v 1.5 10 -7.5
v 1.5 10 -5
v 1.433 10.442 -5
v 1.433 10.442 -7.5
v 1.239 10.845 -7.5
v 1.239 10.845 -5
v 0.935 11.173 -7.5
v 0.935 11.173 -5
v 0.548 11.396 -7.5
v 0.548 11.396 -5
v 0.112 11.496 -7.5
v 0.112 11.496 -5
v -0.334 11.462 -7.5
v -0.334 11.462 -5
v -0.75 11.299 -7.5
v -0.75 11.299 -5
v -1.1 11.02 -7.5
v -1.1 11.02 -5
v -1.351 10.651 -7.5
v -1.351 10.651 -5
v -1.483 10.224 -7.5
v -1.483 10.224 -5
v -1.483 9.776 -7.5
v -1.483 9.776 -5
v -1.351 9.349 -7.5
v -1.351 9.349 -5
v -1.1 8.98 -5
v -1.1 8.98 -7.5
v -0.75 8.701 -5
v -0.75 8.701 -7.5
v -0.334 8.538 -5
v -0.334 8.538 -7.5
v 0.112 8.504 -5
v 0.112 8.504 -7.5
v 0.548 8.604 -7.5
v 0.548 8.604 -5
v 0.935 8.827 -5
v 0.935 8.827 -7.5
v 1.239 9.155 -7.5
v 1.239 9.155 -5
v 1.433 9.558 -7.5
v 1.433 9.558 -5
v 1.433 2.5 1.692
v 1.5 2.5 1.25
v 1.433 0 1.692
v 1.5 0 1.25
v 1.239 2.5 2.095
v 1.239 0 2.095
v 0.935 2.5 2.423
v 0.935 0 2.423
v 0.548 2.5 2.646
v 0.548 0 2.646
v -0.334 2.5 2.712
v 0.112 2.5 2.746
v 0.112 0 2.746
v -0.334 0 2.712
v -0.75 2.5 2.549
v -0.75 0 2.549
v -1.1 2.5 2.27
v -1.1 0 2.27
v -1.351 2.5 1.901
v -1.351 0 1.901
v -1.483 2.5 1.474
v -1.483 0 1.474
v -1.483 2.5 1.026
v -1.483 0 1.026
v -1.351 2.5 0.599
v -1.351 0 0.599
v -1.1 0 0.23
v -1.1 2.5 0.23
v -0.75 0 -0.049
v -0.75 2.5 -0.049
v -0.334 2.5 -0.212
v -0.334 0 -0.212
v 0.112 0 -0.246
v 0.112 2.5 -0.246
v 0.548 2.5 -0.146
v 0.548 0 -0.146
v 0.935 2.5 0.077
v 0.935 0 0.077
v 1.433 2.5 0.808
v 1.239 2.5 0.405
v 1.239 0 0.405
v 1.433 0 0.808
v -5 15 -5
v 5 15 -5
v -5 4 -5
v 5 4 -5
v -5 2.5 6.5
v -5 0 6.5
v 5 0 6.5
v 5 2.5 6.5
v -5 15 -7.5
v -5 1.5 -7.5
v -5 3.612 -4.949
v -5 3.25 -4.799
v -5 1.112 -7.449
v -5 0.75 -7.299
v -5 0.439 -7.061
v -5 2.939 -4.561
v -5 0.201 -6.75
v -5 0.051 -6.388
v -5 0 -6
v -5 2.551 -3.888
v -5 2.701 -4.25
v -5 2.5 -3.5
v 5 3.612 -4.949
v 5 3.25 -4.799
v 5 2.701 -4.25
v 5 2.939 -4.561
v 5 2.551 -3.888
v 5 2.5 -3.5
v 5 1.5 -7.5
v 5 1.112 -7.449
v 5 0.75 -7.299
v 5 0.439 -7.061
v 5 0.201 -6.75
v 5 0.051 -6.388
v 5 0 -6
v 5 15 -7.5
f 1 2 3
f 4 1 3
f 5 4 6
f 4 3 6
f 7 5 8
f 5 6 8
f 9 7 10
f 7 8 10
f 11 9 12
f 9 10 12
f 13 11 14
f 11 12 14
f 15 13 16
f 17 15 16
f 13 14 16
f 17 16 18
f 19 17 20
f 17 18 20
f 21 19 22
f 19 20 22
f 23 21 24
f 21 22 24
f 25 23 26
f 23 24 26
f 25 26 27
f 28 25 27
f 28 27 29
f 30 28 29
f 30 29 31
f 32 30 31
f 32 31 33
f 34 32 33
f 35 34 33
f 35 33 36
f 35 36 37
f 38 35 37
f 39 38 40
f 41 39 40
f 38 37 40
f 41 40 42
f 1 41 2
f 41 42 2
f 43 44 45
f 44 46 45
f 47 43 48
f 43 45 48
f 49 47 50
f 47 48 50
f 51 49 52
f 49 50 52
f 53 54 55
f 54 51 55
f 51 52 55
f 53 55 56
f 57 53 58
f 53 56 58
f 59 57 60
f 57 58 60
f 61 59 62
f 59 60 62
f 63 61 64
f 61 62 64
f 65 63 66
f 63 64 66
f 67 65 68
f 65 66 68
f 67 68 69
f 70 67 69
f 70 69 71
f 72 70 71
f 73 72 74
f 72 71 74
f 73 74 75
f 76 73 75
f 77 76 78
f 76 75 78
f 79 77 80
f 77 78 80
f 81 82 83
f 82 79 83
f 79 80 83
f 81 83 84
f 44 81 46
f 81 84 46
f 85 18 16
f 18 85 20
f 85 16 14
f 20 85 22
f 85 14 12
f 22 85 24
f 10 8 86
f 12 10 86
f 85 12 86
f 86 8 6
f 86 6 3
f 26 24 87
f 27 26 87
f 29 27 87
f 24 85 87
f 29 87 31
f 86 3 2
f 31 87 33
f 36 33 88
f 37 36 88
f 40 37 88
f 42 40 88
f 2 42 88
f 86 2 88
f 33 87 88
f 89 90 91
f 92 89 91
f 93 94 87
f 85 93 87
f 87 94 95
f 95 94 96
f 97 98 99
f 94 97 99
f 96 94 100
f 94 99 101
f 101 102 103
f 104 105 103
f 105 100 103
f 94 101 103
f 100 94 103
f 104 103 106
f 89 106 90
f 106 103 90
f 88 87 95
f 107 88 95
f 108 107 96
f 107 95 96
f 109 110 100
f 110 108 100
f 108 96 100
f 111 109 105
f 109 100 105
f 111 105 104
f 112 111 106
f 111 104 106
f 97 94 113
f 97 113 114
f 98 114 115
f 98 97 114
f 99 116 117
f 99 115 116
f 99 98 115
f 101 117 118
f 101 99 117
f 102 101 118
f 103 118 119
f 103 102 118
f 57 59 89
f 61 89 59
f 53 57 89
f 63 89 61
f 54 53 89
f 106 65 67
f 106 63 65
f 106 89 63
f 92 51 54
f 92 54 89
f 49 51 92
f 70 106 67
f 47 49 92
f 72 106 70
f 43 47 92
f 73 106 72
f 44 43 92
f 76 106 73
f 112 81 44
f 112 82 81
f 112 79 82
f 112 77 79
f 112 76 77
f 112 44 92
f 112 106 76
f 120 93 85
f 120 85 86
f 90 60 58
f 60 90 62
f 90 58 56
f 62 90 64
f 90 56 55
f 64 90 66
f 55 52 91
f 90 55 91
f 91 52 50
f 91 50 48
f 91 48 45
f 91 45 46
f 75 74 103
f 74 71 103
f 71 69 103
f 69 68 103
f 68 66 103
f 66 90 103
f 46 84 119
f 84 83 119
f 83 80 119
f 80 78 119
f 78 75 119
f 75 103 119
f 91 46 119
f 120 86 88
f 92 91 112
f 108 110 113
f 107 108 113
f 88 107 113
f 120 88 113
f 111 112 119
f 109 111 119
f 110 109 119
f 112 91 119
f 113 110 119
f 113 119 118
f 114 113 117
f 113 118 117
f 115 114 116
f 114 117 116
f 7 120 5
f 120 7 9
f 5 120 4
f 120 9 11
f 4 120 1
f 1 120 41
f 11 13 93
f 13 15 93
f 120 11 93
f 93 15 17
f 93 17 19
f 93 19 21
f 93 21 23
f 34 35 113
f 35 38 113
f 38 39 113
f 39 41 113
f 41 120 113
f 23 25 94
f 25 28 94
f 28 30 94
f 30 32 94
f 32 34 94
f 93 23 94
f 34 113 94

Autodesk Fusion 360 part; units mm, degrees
sketch "Sketch1" plane through (0, 0, 0) normal (0, 1, 0) x (1, 0, 0)
  line L0 (5, 6.5) -> (-5, 6.5)
  line L1 (-5, 6.5) -> (-5, -6.5)
  line L2 (-5, -6.5) -> (5, -6.5)
  line L3 (5, -6.5) -> (5, 6.5)
  line L4 (5, 6.5) -> (-5, -6.5) construction
  line L5 (-5, 6.5) -> (5, -6.5) construction
  circle A0 centre (0, -1.25) radius 1.5
  dimension "d1" = 13
  dimension "d2" = 10
  dimension "d21" = 3
  dimension "d22" = 1.25
extrude "Extrude1" add sketch "Sketch1" along normal blind 2.5
sketch "Sketch3" plane through (0, 0, 0) normal (0, 1, 0) x (1, 0, 0)
  line L0 (-5, 5) -> (5, 5)
  line L1 (5, 5) -> (5, 7.5)
  line L2 (5, 7.5) -> (-5, 7.5)
  line L3 (-5, 7.5) -> (-5, 5)
  dimension "d10" = 2.5
  dimension "d11" = 10
  dimension "d12" = 5
  dimension "d13" = 5
extrude "Extrude3" add sketch "Sketch3" along normal blind 15
sketch "Sketch5" plane through (0, 0, -5) normal (0, 0, 1) x (1, 0, 0)
  line L0 (5, 2.5) -> (5, 15)
  line L1 (5, 15) -> (-5, 15)
  line L2 (-5, 15) -> (-5, 2.5)
  circle A0 centre (0, 10) radius 1.5
  line L3 (-5, 2.5) -> (5, 2.5)
  dimension "d16" = 5
  dimension "d17" = 3
extrude "Extrude4" cut sketch "Sketch5" against normal blind 45 contours A0
fillet "Fillet1" radius 1.5 2 edges at (0, 2.5, -5) (0, 0, -7.5)
